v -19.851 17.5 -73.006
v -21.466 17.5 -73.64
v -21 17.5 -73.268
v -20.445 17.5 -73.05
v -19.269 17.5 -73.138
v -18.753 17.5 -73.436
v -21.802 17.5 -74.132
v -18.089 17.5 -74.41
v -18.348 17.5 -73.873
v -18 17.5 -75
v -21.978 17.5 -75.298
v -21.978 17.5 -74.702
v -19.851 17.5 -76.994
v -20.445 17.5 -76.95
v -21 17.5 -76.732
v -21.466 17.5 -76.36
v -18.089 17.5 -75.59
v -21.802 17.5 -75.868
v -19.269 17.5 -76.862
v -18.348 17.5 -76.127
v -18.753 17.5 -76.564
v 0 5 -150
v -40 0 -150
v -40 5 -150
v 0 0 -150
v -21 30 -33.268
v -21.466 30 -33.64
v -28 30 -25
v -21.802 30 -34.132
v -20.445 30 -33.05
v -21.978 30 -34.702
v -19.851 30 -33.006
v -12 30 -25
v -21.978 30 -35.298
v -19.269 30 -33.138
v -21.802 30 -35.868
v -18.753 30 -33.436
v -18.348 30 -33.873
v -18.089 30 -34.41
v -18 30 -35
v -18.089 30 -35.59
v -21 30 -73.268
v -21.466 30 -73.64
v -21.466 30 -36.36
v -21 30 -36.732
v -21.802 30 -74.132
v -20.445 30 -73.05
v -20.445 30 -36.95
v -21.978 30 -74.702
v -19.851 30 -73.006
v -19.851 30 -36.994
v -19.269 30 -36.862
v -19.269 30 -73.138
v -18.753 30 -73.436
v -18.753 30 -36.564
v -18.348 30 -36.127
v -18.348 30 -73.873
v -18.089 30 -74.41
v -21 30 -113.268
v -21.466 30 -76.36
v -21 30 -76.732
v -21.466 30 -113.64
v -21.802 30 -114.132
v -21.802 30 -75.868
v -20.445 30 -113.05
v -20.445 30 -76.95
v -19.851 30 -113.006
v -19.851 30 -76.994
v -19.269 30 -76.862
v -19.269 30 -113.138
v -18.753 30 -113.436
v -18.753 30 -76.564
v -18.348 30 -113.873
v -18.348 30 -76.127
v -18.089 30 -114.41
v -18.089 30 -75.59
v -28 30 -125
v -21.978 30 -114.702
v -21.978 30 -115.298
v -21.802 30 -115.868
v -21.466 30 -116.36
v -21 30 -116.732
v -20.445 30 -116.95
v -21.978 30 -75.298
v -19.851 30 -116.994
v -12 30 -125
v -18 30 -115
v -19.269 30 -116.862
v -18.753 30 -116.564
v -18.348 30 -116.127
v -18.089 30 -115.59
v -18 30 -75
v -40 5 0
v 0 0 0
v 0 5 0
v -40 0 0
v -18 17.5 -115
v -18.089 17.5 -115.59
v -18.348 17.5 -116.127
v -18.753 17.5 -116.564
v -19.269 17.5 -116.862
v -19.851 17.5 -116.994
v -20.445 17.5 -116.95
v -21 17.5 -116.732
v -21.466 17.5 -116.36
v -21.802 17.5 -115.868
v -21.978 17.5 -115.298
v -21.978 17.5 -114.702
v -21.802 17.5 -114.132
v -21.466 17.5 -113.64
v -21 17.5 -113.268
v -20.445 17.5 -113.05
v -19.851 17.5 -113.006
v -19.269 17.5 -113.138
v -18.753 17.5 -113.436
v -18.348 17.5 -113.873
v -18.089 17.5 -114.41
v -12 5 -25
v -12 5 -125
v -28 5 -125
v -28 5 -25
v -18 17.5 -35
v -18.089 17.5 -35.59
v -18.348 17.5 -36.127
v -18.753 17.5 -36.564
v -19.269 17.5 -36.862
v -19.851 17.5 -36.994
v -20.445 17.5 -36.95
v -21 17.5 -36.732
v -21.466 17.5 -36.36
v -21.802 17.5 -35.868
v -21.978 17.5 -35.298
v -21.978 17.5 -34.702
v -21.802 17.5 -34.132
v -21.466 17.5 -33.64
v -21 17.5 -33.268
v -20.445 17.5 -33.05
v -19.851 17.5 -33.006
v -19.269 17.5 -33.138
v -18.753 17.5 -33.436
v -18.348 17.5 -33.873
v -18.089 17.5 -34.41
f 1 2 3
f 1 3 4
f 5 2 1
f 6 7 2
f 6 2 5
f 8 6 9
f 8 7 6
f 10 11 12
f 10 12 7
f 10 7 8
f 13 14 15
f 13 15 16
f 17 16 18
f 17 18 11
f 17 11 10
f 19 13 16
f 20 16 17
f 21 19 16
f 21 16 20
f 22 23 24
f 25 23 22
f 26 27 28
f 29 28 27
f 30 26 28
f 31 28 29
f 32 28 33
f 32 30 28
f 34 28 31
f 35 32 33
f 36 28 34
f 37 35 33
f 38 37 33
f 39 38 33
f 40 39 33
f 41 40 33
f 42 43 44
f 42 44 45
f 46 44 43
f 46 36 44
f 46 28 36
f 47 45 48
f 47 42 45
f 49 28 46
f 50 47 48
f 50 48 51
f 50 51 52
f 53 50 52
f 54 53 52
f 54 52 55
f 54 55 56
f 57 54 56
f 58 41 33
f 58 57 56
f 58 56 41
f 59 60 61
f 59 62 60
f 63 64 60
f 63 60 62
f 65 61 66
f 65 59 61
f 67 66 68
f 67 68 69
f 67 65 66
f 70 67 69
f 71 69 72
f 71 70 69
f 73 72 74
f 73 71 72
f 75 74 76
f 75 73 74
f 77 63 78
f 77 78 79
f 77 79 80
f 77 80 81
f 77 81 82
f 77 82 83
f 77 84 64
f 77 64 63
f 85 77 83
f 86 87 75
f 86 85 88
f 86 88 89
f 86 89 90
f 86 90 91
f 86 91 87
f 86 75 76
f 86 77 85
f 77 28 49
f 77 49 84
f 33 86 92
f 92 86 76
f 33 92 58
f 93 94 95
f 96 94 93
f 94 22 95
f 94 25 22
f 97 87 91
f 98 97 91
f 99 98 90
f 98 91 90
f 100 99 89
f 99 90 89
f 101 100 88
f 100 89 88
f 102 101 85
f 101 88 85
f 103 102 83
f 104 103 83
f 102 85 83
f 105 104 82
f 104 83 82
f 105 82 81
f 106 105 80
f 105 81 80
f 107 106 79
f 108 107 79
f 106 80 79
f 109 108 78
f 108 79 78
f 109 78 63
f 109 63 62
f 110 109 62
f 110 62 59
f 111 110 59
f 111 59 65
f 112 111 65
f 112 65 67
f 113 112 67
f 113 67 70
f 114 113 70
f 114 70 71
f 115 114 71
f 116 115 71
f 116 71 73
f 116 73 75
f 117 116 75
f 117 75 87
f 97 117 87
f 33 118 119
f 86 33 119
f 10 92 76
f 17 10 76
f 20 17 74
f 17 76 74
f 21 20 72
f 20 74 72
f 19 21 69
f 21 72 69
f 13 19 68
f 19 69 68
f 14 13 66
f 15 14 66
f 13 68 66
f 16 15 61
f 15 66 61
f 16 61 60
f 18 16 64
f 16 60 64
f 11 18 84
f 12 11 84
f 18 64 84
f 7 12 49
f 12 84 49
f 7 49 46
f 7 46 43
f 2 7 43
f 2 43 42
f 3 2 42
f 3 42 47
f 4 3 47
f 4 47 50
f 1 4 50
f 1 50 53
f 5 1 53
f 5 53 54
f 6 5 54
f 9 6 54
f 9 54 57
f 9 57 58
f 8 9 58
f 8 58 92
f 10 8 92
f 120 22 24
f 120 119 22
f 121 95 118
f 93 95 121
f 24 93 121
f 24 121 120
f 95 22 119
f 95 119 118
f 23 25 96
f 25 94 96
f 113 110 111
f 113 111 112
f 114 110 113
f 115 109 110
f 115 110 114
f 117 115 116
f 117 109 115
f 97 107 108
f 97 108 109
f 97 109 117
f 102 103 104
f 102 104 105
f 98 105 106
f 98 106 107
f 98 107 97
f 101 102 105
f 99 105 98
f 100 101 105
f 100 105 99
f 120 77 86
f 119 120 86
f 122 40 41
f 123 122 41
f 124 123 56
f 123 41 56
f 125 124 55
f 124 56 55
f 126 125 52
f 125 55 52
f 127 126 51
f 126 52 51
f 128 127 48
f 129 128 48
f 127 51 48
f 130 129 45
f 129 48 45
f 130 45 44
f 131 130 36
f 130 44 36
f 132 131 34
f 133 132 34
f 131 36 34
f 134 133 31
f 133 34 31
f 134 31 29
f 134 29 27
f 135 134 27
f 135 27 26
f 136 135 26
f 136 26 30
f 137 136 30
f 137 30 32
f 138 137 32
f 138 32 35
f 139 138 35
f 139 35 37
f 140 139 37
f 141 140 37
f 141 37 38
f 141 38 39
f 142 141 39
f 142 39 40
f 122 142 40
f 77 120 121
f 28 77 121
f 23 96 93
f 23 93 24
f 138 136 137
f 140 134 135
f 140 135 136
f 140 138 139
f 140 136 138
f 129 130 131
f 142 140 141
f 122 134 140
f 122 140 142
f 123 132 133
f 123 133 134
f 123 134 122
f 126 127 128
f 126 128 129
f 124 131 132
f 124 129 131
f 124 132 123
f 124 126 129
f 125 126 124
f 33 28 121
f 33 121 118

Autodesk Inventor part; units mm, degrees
ref_plane "YZ Plane" through (0, 0, 0) normal (1, 0, 0) x (0, 1, 0)
ref_plane "XZ Plane" through (0, 0, 0) normal (0, 1, 0) x (-1, 0, 0)
ref_plane "XY Plane" through (0, 0, 0) normal (0, 0, 1) x (1, 0, 0)
sketch "Sketch1" plane through (0, 0, 0) normal (0, 1, 0) x (-1, 0, 0)
  line L0 (0, 0) -> (40, 0)
  line L1 (40, 0) -> (40, -150)
  line L2 (40, -150) -> (0, -150)
  line L3 (0, -150) -> (0, 0)
  dimension "d0" = 40
  dimension "d1" = 150
extrude "Extrusion1" add sketch "Sketch1" along normal blind 5
sketch "Sketch2" plane through (0, 5, 0) normal (0, 1, 0) x (1, 0, 0)
  line L0 (-40, 0) -> (0, 0) projected
  line L1 (0, 150) -> (-40, 150) projected
  line L2 (-40, 0) -> (-20, 0)
  line L3 (-20, 0) -> (-20, 150)
  line L4 (-20, 150) -> (-40, 150)
  line L5 (-40, 150) -> (-40, 0)
  line L6 (-20, 0) -> (-20, 75)
  line L7 (-20, 75) -> (-20, 35)
  line L8 (-20, 35) -> (-28, 35)
  line L9 (-28, 35) -> (-28, 25)
  line L10 (-28, 25) -> (-20, 25)
  line L11 (-20, 25) -> (-20, 35)
  line L12 (-20, 25) -> (-12, 25)
  line L13 (-12, 25) -> (-12, 35)
  line L14 (-12, 35) -> (-20, 35)
  line L15 (-20, 35) -> (-20, 25)
  line L16 (-20, 75) -> (-20, 115)
  line L17 (-20, 115) -> (-28, 115)
  line L18 (-28, 115) -> (-28, 125)
  line L19 (-28, 125) -> (-20, 125)
  line L20 (-20, 125) -> (-20, 115)
  line L21 (-20, 115) -> (-12, 115)
  line L22 (-12, 115) -> (-12, 125)
  line L23 (-12, 125) -> (-20, 125)
  line L24 (-20, 125) -> (-20, 115)
  line L25 (-28, 125) -> (-12, 125)
  line L26 (-12, 125) -> (-12, 25)
  line L27 (-12, 25) -> (-28, 25)
  line L28 (-28, 25) -> (-28, 125)
  dimension "d4" = 75
  dimension "d5" = 40
  dimension "d6" = 8
  dimension "d7" = 10
  dimension "d8" = 8
  dimension "d9" = 40
  dimension "d10" = 10
extrude "Extrusion2" add sketch "Sketch2" along normal blind 25 contours L10 L9 L8 L3 | L3 L14 L13 L12 | L8 L28 L17 L3 | L3 L21 L26 L14 | L23 L22 L21 L3 | L3 L17 L18 L19
sketch "Sketch3" plane through (0, 30, 0) normal (0, 1, 0) x (1, 0, 0)
  line L0 (-12, 25) -> (-28, 25) projected
  line L1 (-20, 25) -> (-20, 125)
  line L2 (-12, 125) -> (-28, 125) projected
  line L3 (-20, 25) -> (-20, 75)
  line L4 (-20, 75) -> (-20, 35)
  line L5 (-20, 35) -> (-20, 115)
  circle A0 centre (-20, 35) radius 2
  circle A1 centre (-20, 75) radius 2
  circle A2 centre (-20, 115) radius 2
  point P0 (0, 0)
  dimension "d13" = 40
  dimension "d14" = 80
  dimension "d15" = 4
  dimension "d16" = 4
  dimension "d17" = 4
extrude "Extrusion3" cut sketch "Sketch3" against normal blind 12.5
properties part number "Pin holder"
